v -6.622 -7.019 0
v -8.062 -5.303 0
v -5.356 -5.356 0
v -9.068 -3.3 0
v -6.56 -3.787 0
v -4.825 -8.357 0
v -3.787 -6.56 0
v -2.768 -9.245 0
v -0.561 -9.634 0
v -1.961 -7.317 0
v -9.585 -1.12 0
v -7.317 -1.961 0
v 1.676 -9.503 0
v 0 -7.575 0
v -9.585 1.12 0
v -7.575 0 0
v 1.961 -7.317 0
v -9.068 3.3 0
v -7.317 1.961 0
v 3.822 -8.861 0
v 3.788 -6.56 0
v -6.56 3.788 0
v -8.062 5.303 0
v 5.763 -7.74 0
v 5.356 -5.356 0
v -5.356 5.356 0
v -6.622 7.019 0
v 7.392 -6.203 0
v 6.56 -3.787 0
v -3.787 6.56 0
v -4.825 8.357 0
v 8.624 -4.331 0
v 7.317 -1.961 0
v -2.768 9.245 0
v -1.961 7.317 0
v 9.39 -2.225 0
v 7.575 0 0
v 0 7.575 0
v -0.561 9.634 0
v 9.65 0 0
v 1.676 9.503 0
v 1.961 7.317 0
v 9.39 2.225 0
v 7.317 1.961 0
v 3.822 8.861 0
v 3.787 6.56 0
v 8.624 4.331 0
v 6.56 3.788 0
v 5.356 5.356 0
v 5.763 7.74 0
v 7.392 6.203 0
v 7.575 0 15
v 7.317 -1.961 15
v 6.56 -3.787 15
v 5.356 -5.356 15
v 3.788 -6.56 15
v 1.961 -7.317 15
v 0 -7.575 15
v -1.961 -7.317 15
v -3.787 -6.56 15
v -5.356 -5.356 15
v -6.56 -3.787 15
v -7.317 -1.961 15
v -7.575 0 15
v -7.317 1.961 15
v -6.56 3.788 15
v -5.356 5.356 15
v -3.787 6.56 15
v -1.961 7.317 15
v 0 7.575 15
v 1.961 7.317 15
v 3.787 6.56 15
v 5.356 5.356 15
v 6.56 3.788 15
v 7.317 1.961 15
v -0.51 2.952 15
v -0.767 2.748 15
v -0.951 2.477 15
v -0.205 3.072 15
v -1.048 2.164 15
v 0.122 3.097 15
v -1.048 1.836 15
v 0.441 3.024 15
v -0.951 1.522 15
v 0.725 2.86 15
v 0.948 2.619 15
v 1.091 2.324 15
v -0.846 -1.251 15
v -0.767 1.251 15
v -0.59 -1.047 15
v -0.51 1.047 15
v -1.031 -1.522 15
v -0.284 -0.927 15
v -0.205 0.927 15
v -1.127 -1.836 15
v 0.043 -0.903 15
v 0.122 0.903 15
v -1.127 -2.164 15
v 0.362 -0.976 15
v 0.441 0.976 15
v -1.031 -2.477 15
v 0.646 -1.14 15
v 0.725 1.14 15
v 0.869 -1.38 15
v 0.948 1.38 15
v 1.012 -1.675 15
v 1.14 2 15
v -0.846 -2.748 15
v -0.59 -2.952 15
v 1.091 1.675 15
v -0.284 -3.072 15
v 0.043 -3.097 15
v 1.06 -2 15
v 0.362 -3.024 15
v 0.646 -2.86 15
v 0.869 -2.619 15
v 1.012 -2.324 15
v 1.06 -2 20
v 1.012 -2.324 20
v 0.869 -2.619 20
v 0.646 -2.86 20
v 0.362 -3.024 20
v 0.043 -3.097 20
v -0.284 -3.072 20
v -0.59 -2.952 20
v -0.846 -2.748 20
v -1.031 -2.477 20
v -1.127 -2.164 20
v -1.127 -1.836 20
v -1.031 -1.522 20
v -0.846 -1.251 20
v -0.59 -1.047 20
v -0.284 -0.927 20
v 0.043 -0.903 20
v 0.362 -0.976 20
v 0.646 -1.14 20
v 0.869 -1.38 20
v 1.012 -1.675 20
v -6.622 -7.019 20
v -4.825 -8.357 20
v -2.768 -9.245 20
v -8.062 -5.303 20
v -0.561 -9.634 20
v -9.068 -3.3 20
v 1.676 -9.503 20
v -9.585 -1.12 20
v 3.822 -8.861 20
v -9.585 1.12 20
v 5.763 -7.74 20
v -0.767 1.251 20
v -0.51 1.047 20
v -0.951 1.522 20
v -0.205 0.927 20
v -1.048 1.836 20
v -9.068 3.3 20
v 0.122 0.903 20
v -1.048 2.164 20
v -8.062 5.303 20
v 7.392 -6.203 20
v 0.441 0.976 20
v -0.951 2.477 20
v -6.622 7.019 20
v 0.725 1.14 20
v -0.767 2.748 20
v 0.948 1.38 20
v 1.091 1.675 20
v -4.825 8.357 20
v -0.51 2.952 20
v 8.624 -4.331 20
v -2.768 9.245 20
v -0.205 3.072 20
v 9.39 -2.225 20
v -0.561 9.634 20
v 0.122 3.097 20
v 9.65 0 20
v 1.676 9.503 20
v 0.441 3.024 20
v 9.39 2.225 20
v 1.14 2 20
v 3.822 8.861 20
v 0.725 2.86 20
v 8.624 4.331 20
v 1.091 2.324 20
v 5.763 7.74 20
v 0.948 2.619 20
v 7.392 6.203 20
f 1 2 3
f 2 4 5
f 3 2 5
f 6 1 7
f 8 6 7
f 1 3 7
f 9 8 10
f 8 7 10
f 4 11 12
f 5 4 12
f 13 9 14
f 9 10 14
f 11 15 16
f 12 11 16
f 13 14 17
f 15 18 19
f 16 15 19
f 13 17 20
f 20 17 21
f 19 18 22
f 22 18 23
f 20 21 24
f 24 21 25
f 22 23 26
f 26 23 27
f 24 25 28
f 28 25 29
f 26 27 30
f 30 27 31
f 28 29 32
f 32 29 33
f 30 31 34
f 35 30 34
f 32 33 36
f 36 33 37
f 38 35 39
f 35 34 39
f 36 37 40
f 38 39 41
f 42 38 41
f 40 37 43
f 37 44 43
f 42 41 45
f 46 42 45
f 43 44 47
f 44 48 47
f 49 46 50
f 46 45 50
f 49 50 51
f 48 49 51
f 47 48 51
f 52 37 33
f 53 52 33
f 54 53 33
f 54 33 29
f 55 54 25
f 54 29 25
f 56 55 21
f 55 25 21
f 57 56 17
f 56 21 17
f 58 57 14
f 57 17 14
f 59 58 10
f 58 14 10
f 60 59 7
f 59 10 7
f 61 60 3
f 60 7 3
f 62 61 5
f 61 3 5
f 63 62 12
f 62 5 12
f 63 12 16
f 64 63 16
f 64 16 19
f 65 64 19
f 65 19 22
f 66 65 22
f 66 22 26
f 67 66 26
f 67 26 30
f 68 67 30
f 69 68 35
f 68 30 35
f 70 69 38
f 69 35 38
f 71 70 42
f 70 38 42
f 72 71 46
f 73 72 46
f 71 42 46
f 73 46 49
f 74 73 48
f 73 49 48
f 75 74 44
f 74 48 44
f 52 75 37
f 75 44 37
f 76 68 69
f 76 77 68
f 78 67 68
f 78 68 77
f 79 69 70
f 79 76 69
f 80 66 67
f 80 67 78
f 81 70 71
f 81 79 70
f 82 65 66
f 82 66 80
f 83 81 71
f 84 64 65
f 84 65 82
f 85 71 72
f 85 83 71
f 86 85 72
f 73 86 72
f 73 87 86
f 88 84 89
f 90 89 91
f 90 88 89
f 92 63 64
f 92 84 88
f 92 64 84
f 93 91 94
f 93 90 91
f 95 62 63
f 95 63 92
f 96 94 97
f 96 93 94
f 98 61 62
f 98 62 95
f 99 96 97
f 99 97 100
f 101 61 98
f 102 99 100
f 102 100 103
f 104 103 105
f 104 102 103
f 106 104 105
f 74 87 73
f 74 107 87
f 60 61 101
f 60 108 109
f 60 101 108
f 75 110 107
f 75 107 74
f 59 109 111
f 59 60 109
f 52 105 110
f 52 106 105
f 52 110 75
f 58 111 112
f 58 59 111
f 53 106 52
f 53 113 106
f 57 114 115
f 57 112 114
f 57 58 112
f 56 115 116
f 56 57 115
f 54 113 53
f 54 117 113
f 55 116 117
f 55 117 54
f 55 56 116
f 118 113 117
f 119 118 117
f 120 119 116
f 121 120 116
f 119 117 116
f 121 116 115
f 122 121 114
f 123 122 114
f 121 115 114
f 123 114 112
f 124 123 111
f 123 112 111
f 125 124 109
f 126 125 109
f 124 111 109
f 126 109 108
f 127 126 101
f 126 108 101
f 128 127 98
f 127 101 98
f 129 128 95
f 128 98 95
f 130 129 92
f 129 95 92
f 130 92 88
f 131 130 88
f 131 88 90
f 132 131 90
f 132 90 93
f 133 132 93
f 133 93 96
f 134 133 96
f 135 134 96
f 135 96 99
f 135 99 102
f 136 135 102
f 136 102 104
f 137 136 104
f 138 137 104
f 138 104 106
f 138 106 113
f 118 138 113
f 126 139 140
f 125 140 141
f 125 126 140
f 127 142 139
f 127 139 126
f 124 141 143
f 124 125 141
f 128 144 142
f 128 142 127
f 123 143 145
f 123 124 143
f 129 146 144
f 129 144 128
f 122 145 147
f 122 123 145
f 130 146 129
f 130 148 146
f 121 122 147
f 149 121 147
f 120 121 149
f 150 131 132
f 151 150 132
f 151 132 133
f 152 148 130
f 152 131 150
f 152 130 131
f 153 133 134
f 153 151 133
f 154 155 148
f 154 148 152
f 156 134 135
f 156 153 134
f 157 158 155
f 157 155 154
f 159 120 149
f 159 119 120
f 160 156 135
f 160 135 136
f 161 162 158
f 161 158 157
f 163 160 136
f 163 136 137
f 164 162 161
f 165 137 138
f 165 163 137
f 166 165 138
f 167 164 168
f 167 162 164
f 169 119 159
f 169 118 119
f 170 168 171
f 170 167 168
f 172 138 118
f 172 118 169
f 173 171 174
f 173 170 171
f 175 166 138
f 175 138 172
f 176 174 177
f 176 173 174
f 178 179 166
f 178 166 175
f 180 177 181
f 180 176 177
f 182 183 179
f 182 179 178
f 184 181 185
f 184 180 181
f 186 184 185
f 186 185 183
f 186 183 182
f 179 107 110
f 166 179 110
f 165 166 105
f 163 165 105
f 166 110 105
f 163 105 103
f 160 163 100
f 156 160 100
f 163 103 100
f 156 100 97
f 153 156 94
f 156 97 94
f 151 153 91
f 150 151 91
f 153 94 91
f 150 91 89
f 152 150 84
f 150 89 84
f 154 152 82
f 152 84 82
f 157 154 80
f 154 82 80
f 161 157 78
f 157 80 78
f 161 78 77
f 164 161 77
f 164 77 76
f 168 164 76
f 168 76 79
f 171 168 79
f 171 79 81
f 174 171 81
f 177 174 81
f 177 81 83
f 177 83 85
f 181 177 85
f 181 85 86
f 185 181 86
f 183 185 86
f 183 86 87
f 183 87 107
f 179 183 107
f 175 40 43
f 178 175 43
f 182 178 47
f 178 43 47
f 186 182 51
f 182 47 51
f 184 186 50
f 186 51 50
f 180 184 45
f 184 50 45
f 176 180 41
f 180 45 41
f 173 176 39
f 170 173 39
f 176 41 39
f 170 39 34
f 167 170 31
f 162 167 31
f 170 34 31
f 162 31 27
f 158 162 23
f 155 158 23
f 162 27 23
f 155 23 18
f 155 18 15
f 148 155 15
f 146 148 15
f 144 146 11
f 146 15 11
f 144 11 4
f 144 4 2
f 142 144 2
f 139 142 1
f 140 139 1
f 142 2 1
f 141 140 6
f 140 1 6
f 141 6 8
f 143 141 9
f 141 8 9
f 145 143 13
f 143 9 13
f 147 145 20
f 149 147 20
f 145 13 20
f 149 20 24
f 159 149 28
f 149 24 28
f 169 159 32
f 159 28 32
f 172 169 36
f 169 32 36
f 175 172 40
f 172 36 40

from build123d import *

# Parameters (mm, degrees)
F0_R     = 9.65
F0_R_2   = 7.575
F1_DEPTH = 20
F2_R     = 7.575
F3_DEPTH = 15
F4_R     = 1.1
F5_DEPTH = 5.001


with BuildPart() as f1:
    # F0 (on Top) → F1 (new body)
    with BuildSketch(Plane.XY):
        Circle(F0_R)
        Circle(F0_R_2, mode=Mode.SUBTRACT)
        Circle(F0_R_2)
    extrude(amount=F1_DEPTH)

    # F2 (on face) → F3 (cut)
    with BuildSketch(Plane(origin=(0, 0, 0), x_dir=(1, 0, 0), z_dir=(0, 0, -1))):
        Circle(F2_R)
    extrude(amount=-F3_DEPTH, mode=Mode.SUBTRACT)

    # F4 (on face) → F5 (cut, through all)
    with BuildSketch(Plane(origin=(0, 0, 15), x_dir=(1, 0, 0), z_dir=(0, 0, -1))):
        with Locations((-0.039568, 1.999609)):
            Circle(F4_R)
        with Locations((0.039568, -1.999609)):
            Circle(F4_R)
    extrude(amount=-F5_DEPTH, mode=Mode.SUBTRACT)


solid = f1.part
